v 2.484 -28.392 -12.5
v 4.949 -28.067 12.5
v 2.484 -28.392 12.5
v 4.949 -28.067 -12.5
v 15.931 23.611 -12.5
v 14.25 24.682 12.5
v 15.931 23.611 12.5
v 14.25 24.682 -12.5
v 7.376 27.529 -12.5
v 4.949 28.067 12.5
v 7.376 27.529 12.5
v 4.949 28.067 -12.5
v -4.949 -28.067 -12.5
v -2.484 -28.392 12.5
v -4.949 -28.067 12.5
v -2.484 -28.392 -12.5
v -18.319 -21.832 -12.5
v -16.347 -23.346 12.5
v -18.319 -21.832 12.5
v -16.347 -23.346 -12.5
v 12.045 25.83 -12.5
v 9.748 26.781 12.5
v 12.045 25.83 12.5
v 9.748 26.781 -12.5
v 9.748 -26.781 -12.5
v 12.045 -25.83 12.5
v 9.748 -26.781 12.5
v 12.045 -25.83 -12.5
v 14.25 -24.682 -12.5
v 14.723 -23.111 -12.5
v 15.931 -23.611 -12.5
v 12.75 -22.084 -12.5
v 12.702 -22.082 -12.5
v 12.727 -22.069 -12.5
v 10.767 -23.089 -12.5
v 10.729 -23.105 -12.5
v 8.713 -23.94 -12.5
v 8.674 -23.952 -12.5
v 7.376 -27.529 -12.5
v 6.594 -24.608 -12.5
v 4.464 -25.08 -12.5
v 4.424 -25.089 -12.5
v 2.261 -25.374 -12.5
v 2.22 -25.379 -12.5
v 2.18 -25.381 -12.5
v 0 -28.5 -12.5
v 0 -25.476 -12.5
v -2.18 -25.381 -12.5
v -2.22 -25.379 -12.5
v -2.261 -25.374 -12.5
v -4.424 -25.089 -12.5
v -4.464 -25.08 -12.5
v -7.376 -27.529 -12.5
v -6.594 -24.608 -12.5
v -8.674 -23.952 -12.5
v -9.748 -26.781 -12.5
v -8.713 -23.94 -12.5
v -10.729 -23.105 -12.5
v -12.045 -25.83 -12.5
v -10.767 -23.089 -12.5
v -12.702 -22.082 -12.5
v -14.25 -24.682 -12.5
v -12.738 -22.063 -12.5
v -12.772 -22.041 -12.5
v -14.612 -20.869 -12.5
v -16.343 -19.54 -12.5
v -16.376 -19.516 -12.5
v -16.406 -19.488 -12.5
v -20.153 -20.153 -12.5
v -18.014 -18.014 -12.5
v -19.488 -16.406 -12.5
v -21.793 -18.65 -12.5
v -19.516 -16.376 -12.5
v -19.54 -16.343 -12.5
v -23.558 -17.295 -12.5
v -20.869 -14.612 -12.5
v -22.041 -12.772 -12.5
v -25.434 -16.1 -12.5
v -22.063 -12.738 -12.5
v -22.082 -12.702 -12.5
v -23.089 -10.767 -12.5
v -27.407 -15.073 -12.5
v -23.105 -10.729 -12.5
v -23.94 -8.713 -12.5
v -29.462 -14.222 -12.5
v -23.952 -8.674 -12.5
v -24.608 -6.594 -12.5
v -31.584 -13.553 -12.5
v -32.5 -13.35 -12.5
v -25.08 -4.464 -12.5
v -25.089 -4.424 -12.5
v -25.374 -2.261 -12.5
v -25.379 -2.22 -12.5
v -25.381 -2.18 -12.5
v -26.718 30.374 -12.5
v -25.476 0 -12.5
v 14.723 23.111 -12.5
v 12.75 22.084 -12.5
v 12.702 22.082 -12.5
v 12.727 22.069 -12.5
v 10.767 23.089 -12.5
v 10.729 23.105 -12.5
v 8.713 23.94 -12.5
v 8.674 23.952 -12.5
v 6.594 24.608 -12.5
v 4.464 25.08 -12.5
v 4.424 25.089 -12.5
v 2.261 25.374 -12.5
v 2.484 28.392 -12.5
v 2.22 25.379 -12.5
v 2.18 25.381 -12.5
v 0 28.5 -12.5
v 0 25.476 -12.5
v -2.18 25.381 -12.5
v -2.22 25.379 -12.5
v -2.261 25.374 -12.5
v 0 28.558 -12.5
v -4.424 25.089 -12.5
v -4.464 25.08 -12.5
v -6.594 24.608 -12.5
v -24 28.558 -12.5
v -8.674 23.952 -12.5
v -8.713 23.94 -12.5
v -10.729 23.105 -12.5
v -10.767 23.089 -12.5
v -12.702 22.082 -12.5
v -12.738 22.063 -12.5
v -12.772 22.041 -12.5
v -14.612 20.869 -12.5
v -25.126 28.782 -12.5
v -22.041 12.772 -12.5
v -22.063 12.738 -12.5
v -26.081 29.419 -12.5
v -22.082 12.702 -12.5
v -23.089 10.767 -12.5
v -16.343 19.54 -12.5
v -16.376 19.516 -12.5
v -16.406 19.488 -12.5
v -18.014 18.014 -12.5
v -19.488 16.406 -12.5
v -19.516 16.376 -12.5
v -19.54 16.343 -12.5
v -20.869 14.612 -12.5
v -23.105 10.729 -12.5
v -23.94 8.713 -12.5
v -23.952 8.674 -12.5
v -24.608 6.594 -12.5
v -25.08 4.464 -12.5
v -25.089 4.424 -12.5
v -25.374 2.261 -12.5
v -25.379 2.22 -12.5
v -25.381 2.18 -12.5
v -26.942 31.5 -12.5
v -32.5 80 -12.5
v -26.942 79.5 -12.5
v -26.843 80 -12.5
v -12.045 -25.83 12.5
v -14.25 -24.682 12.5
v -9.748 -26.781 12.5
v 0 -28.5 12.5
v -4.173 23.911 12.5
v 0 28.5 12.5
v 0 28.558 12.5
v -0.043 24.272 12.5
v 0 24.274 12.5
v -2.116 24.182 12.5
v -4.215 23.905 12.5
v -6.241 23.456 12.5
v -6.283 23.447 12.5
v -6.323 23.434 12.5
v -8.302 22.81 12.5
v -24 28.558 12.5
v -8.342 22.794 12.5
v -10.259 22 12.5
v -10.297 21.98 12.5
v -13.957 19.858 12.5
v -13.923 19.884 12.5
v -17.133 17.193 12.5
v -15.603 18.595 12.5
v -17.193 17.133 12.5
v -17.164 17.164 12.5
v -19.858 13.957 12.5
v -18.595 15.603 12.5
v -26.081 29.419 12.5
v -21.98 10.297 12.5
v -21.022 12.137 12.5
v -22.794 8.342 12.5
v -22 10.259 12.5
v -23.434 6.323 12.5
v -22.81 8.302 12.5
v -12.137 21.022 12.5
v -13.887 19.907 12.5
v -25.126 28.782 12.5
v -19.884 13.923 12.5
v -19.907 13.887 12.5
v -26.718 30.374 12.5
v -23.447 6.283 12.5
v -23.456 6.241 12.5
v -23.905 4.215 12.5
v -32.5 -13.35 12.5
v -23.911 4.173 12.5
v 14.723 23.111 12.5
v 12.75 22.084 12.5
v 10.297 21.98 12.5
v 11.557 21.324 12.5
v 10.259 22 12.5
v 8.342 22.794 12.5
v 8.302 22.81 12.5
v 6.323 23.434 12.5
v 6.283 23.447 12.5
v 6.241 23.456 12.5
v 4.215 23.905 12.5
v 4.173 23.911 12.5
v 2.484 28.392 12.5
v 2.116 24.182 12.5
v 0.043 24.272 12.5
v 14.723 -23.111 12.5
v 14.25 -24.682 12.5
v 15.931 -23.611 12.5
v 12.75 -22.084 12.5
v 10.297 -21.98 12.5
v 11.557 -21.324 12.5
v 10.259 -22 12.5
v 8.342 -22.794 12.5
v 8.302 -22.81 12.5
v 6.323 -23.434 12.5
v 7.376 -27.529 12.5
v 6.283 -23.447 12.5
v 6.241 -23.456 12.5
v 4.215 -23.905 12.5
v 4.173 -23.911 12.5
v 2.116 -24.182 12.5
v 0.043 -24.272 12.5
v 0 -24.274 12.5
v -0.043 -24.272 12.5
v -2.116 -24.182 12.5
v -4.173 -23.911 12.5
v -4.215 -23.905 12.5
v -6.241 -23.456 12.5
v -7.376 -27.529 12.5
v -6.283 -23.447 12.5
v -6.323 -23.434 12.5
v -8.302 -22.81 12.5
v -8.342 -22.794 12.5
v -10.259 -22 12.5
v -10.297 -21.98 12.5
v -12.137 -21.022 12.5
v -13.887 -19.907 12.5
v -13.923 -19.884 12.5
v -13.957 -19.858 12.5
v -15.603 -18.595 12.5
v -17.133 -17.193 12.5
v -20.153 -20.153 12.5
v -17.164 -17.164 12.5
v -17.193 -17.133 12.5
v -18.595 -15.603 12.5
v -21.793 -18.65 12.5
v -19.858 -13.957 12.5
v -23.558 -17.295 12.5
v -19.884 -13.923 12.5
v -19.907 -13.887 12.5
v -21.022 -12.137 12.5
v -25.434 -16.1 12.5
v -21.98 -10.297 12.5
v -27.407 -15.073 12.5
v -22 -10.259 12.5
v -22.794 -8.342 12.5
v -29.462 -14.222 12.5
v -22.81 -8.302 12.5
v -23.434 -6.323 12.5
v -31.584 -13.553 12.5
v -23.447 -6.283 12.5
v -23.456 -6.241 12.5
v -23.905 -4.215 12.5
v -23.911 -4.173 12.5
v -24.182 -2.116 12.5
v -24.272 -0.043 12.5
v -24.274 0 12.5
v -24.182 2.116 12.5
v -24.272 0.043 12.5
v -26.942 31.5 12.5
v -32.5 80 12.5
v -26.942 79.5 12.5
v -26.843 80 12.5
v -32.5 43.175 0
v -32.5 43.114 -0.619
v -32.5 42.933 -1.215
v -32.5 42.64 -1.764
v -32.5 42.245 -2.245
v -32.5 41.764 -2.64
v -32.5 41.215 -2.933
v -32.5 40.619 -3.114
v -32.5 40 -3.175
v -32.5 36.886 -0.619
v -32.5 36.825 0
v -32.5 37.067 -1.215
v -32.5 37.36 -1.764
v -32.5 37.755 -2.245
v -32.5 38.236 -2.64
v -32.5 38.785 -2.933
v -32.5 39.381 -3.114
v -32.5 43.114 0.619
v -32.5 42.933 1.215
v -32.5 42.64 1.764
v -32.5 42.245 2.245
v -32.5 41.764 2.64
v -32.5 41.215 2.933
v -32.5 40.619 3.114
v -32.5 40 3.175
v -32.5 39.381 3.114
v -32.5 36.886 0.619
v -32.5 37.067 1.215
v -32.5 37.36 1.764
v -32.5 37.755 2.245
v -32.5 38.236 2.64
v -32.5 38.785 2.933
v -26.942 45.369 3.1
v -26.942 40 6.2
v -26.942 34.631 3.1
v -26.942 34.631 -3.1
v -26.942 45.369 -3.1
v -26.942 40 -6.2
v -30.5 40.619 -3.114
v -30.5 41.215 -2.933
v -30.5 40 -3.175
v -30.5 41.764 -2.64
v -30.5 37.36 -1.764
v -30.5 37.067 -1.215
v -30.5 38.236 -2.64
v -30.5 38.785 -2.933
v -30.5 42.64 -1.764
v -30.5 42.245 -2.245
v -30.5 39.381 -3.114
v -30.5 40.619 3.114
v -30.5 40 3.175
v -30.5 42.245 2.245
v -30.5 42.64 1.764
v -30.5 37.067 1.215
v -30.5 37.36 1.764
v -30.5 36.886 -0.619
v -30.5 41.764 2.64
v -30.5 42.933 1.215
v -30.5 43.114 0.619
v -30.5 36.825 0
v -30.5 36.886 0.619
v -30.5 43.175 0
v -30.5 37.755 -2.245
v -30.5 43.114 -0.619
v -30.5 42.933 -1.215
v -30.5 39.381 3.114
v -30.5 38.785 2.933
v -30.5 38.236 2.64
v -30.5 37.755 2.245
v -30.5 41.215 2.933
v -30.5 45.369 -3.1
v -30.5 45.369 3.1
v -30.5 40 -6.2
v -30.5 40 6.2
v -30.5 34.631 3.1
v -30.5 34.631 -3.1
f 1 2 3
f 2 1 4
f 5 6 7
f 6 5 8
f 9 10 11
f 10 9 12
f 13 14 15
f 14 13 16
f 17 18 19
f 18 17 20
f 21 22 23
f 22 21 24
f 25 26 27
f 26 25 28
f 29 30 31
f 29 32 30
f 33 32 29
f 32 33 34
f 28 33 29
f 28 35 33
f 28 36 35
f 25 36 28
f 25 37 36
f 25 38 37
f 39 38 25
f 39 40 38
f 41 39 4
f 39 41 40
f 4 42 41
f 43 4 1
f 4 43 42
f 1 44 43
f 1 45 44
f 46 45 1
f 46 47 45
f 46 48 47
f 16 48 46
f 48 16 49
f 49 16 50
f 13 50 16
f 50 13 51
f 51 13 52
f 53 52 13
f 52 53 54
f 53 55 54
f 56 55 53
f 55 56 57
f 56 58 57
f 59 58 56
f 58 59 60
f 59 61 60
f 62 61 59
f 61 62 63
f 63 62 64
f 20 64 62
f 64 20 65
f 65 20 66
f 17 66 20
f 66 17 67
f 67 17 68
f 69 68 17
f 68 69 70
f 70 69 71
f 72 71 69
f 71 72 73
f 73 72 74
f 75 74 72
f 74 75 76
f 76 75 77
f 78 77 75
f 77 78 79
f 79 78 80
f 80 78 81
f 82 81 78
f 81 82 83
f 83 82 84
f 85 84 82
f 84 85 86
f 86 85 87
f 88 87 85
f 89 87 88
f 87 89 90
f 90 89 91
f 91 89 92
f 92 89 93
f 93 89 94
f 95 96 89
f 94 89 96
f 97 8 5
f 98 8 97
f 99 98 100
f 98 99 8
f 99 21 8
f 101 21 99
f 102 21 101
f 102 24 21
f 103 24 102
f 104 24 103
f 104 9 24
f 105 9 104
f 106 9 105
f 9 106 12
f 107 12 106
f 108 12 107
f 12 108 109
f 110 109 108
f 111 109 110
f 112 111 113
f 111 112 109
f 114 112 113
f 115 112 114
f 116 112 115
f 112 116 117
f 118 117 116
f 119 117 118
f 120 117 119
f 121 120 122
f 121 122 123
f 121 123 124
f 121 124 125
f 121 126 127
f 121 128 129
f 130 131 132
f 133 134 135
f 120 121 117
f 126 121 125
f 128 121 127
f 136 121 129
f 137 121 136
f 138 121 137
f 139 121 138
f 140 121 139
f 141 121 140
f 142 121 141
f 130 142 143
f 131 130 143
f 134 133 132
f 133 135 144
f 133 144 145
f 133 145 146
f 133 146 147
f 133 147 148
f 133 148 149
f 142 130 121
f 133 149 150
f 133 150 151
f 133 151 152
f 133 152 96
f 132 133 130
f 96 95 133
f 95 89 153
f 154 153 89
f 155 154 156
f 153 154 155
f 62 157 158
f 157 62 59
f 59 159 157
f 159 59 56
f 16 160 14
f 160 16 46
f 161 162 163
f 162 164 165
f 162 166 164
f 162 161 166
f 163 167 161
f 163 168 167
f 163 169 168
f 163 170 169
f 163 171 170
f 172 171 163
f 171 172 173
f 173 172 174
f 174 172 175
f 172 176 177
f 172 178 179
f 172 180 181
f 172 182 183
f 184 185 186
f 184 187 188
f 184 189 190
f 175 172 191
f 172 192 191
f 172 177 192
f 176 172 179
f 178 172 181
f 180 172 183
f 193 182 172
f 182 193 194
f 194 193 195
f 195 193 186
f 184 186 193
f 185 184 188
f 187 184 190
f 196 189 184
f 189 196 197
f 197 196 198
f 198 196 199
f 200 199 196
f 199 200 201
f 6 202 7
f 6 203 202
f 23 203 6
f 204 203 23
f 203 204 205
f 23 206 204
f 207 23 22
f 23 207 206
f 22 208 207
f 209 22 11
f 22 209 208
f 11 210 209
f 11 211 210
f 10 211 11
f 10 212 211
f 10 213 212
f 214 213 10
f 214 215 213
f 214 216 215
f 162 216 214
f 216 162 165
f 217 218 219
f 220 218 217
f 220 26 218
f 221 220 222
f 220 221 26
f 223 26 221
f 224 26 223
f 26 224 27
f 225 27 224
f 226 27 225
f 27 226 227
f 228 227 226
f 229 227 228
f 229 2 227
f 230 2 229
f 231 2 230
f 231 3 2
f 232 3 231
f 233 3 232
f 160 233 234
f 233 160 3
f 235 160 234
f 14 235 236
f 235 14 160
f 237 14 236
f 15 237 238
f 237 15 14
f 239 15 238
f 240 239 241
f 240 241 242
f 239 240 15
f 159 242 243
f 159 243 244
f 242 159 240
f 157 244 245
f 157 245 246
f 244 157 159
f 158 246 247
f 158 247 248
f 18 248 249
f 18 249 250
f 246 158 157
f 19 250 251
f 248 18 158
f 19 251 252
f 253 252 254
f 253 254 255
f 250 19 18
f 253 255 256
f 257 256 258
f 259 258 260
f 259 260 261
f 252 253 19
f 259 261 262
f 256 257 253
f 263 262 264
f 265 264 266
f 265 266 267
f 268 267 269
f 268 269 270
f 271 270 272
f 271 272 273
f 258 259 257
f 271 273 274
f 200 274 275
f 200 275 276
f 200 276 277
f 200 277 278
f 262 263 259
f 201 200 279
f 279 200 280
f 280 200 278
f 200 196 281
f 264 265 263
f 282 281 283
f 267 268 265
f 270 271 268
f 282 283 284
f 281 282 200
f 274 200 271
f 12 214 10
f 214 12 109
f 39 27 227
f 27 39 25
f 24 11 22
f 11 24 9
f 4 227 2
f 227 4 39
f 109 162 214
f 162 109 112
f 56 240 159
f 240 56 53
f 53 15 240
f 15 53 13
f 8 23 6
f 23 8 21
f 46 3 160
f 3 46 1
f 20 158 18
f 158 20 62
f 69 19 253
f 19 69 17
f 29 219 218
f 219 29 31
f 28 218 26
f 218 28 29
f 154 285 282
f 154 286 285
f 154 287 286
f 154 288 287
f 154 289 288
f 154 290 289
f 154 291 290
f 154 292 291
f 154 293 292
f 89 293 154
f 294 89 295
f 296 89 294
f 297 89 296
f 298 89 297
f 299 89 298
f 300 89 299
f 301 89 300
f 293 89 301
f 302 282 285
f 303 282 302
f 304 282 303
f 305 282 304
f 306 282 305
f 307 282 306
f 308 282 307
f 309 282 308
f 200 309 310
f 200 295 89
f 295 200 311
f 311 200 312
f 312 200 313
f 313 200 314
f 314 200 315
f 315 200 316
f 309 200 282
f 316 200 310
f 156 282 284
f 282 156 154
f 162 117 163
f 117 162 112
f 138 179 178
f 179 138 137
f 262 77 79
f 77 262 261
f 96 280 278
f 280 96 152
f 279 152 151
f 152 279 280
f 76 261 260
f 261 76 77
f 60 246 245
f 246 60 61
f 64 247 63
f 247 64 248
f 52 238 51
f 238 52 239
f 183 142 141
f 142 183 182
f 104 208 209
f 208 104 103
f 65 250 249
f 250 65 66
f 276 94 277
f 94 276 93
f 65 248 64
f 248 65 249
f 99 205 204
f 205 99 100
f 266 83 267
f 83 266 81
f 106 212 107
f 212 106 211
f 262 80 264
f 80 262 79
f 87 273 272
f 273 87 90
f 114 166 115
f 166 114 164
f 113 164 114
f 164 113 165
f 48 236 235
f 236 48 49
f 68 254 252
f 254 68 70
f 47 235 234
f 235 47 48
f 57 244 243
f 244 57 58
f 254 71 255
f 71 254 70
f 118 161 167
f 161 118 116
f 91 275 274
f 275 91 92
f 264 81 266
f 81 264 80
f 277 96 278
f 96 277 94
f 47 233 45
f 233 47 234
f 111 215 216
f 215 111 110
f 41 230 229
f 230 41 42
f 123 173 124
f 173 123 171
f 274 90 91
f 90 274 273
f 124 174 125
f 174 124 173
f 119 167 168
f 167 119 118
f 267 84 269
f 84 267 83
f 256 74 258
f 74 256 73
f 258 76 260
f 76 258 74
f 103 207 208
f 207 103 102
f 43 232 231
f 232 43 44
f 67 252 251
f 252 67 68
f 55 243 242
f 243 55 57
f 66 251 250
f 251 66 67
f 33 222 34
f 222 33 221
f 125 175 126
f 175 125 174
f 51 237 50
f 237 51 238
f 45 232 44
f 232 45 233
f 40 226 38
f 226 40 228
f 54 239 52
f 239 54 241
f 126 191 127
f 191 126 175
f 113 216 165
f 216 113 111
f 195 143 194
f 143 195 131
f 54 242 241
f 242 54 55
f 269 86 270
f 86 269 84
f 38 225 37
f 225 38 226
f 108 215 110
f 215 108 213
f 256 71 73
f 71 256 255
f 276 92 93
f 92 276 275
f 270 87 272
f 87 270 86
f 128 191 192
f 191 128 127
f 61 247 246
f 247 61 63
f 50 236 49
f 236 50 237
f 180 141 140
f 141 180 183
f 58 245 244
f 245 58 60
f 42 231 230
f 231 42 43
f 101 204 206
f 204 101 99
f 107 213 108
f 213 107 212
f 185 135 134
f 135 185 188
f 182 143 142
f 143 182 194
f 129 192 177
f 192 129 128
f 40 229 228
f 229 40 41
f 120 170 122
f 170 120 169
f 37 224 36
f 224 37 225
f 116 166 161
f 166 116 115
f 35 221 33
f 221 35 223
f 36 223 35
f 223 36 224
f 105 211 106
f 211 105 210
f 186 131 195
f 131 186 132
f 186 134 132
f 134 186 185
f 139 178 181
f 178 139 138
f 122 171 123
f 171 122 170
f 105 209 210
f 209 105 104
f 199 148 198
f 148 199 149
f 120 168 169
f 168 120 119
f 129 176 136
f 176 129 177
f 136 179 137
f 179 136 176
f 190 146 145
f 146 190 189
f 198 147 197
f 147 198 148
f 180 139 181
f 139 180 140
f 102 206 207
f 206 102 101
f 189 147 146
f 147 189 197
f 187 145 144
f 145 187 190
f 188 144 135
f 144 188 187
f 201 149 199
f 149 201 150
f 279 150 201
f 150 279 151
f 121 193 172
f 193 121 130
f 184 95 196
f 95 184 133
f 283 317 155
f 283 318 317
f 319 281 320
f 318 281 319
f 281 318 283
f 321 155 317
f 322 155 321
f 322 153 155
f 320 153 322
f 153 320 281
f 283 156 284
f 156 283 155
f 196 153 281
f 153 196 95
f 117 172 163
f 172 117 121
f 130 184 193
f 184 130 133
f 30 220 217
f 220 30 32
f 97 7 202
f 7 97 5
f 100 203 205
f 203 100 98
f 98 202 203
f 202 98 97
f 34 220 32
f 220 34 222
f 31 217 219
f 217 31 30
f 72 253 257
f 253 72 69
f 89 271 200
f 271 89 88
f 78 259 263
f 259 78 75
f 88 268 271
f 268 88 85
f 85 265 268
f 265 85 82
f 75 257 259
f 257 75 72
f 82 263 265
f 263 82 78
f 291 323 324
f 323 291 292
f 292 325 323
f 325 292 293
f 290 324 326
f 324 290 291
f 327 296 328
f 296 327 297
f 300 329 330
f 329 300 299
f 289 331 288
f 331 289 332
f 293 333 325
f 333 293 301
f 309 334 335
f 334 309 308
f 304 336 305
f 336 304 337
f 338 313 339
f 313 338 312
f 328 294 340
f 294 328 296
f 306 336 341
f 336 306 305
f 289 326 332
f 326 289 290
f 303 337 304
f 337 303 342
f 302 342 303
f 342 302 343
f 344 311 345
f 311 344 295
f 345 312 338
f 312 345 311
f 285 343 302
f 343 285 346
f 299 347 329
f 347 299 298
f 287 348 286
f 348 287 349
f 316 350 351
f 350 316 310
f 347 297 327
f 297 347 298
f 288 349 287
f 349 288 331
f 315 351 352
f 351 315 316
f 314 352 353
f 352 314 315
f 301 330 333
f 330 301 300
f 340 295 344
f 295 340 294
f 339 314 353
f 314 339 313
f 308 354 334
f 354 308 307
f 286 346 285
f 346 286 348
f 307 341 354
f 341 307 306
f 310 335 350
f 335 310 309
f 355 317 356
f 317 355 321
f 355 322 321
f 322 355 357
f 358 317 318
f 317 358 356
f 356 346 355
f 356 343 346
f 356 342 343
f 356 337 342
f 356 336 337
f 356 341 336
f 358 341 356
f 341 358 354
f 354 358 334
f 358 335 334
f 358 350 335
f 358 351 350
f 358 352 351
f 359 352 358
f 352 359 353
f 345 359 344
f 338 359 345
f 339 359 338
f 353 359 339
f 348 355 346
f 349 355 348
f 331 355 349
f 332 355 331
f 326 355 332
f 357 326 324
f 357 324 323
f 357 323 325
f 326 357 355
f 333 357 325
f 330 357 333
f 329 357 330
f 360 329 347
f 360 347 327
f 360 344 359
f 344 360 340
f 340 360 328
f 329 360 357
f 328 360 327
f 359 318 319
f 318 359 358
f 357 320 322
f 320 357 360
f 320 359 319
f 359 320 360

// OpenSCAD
barrel_diameter= 51;
barrel_diameter_min = 48.5;
depth=25;
arm_length=80;
screw_offset = 0;

rotate([0,90,0]) intersection()
{
	cube([depth+1,arm_length*2,barrel_diameter+14],center=true);
	difference()
    {
        //Main Body
		union()
        {
			rotate([0,90,0])
                cylinder(d=barrel_diameter+6,h=depth,center=true,$fa=5);
            
			rotate([-135,0,0]) 
                translate([0,barrel_diameter/2,barrel_diameter/2]) 
                    cube([depth,barrel_diameter,barrel_diameter],center=true);
			
            //translate([-depth/2,0,-barrel_diameter/2-7]) cube([depth,arm_length,barrel_diameter/2+4]);
			
            translate([-depth/2,0,-barrel_diameter/2-7]) 
                cube([depth,arm_length,7]);
			
            translate([-depth/2,0,-barrel_diameter/2]) 
                cube([depth,barrel_diameter+3,barrel_diameter/2]);
		}
        
        //All the holes
		union()
        {
            //Binocular Barrel - can be concial
			rotate([0,90,0]) 
                cylinder(d2=barrel_diameter, d1=barrel_diameter_min,h=depth+1,center=true,$fa=5);
			
            
            //Cut-out inside of barrel clamp
            translate([0,barrel_diameter+4.5,0]) 
                rotate([0,90,0]) 
                    minkowski ()
                        {
                            cube ([barrel_diameter-3, barrel_diameter-3, 2 * depth], center=true);
                            sphere (3, $fn=16);
                        }
            
            //Top barrel clamp cut-out
			translate([0,0,barrel_diameter/2]) 
                rotate([0,90,0]) 
                    cylinder(d=barrel_diameter,h=depth+1,center=true,$fa=5);
            
            //Fillet lower outside of barrel clamp
			rotate([135,0,0]) 
                translate([0,0,barrel_diameter+3]) 
                    rotate([0,90,0]) 
                        cylinder(d=barrel_diameter,h=depth+1,center=true,$fa=5);
            
			//rotate([-135,0,0]) translate([0,0,barrel_diameter+3]) rotate([0,90,0]) cylinder(d=barrel_diameter,h=depth+1,center=true,$fa=5);
            
            //Screw hole        
			translate([0,arm_length/2 + screw_offset,-barrel_diameter/2-3]) 
                cylinder(h=10, d=6.35, center=true, $fn=32);
            
            //Screw head cut-out
			translate([0,arm_length/2 + screw_offset,-barrel_diameter/2-5]) 
                cylinder(h=10, d=12.4, $fa=60);
		}
	}
}
